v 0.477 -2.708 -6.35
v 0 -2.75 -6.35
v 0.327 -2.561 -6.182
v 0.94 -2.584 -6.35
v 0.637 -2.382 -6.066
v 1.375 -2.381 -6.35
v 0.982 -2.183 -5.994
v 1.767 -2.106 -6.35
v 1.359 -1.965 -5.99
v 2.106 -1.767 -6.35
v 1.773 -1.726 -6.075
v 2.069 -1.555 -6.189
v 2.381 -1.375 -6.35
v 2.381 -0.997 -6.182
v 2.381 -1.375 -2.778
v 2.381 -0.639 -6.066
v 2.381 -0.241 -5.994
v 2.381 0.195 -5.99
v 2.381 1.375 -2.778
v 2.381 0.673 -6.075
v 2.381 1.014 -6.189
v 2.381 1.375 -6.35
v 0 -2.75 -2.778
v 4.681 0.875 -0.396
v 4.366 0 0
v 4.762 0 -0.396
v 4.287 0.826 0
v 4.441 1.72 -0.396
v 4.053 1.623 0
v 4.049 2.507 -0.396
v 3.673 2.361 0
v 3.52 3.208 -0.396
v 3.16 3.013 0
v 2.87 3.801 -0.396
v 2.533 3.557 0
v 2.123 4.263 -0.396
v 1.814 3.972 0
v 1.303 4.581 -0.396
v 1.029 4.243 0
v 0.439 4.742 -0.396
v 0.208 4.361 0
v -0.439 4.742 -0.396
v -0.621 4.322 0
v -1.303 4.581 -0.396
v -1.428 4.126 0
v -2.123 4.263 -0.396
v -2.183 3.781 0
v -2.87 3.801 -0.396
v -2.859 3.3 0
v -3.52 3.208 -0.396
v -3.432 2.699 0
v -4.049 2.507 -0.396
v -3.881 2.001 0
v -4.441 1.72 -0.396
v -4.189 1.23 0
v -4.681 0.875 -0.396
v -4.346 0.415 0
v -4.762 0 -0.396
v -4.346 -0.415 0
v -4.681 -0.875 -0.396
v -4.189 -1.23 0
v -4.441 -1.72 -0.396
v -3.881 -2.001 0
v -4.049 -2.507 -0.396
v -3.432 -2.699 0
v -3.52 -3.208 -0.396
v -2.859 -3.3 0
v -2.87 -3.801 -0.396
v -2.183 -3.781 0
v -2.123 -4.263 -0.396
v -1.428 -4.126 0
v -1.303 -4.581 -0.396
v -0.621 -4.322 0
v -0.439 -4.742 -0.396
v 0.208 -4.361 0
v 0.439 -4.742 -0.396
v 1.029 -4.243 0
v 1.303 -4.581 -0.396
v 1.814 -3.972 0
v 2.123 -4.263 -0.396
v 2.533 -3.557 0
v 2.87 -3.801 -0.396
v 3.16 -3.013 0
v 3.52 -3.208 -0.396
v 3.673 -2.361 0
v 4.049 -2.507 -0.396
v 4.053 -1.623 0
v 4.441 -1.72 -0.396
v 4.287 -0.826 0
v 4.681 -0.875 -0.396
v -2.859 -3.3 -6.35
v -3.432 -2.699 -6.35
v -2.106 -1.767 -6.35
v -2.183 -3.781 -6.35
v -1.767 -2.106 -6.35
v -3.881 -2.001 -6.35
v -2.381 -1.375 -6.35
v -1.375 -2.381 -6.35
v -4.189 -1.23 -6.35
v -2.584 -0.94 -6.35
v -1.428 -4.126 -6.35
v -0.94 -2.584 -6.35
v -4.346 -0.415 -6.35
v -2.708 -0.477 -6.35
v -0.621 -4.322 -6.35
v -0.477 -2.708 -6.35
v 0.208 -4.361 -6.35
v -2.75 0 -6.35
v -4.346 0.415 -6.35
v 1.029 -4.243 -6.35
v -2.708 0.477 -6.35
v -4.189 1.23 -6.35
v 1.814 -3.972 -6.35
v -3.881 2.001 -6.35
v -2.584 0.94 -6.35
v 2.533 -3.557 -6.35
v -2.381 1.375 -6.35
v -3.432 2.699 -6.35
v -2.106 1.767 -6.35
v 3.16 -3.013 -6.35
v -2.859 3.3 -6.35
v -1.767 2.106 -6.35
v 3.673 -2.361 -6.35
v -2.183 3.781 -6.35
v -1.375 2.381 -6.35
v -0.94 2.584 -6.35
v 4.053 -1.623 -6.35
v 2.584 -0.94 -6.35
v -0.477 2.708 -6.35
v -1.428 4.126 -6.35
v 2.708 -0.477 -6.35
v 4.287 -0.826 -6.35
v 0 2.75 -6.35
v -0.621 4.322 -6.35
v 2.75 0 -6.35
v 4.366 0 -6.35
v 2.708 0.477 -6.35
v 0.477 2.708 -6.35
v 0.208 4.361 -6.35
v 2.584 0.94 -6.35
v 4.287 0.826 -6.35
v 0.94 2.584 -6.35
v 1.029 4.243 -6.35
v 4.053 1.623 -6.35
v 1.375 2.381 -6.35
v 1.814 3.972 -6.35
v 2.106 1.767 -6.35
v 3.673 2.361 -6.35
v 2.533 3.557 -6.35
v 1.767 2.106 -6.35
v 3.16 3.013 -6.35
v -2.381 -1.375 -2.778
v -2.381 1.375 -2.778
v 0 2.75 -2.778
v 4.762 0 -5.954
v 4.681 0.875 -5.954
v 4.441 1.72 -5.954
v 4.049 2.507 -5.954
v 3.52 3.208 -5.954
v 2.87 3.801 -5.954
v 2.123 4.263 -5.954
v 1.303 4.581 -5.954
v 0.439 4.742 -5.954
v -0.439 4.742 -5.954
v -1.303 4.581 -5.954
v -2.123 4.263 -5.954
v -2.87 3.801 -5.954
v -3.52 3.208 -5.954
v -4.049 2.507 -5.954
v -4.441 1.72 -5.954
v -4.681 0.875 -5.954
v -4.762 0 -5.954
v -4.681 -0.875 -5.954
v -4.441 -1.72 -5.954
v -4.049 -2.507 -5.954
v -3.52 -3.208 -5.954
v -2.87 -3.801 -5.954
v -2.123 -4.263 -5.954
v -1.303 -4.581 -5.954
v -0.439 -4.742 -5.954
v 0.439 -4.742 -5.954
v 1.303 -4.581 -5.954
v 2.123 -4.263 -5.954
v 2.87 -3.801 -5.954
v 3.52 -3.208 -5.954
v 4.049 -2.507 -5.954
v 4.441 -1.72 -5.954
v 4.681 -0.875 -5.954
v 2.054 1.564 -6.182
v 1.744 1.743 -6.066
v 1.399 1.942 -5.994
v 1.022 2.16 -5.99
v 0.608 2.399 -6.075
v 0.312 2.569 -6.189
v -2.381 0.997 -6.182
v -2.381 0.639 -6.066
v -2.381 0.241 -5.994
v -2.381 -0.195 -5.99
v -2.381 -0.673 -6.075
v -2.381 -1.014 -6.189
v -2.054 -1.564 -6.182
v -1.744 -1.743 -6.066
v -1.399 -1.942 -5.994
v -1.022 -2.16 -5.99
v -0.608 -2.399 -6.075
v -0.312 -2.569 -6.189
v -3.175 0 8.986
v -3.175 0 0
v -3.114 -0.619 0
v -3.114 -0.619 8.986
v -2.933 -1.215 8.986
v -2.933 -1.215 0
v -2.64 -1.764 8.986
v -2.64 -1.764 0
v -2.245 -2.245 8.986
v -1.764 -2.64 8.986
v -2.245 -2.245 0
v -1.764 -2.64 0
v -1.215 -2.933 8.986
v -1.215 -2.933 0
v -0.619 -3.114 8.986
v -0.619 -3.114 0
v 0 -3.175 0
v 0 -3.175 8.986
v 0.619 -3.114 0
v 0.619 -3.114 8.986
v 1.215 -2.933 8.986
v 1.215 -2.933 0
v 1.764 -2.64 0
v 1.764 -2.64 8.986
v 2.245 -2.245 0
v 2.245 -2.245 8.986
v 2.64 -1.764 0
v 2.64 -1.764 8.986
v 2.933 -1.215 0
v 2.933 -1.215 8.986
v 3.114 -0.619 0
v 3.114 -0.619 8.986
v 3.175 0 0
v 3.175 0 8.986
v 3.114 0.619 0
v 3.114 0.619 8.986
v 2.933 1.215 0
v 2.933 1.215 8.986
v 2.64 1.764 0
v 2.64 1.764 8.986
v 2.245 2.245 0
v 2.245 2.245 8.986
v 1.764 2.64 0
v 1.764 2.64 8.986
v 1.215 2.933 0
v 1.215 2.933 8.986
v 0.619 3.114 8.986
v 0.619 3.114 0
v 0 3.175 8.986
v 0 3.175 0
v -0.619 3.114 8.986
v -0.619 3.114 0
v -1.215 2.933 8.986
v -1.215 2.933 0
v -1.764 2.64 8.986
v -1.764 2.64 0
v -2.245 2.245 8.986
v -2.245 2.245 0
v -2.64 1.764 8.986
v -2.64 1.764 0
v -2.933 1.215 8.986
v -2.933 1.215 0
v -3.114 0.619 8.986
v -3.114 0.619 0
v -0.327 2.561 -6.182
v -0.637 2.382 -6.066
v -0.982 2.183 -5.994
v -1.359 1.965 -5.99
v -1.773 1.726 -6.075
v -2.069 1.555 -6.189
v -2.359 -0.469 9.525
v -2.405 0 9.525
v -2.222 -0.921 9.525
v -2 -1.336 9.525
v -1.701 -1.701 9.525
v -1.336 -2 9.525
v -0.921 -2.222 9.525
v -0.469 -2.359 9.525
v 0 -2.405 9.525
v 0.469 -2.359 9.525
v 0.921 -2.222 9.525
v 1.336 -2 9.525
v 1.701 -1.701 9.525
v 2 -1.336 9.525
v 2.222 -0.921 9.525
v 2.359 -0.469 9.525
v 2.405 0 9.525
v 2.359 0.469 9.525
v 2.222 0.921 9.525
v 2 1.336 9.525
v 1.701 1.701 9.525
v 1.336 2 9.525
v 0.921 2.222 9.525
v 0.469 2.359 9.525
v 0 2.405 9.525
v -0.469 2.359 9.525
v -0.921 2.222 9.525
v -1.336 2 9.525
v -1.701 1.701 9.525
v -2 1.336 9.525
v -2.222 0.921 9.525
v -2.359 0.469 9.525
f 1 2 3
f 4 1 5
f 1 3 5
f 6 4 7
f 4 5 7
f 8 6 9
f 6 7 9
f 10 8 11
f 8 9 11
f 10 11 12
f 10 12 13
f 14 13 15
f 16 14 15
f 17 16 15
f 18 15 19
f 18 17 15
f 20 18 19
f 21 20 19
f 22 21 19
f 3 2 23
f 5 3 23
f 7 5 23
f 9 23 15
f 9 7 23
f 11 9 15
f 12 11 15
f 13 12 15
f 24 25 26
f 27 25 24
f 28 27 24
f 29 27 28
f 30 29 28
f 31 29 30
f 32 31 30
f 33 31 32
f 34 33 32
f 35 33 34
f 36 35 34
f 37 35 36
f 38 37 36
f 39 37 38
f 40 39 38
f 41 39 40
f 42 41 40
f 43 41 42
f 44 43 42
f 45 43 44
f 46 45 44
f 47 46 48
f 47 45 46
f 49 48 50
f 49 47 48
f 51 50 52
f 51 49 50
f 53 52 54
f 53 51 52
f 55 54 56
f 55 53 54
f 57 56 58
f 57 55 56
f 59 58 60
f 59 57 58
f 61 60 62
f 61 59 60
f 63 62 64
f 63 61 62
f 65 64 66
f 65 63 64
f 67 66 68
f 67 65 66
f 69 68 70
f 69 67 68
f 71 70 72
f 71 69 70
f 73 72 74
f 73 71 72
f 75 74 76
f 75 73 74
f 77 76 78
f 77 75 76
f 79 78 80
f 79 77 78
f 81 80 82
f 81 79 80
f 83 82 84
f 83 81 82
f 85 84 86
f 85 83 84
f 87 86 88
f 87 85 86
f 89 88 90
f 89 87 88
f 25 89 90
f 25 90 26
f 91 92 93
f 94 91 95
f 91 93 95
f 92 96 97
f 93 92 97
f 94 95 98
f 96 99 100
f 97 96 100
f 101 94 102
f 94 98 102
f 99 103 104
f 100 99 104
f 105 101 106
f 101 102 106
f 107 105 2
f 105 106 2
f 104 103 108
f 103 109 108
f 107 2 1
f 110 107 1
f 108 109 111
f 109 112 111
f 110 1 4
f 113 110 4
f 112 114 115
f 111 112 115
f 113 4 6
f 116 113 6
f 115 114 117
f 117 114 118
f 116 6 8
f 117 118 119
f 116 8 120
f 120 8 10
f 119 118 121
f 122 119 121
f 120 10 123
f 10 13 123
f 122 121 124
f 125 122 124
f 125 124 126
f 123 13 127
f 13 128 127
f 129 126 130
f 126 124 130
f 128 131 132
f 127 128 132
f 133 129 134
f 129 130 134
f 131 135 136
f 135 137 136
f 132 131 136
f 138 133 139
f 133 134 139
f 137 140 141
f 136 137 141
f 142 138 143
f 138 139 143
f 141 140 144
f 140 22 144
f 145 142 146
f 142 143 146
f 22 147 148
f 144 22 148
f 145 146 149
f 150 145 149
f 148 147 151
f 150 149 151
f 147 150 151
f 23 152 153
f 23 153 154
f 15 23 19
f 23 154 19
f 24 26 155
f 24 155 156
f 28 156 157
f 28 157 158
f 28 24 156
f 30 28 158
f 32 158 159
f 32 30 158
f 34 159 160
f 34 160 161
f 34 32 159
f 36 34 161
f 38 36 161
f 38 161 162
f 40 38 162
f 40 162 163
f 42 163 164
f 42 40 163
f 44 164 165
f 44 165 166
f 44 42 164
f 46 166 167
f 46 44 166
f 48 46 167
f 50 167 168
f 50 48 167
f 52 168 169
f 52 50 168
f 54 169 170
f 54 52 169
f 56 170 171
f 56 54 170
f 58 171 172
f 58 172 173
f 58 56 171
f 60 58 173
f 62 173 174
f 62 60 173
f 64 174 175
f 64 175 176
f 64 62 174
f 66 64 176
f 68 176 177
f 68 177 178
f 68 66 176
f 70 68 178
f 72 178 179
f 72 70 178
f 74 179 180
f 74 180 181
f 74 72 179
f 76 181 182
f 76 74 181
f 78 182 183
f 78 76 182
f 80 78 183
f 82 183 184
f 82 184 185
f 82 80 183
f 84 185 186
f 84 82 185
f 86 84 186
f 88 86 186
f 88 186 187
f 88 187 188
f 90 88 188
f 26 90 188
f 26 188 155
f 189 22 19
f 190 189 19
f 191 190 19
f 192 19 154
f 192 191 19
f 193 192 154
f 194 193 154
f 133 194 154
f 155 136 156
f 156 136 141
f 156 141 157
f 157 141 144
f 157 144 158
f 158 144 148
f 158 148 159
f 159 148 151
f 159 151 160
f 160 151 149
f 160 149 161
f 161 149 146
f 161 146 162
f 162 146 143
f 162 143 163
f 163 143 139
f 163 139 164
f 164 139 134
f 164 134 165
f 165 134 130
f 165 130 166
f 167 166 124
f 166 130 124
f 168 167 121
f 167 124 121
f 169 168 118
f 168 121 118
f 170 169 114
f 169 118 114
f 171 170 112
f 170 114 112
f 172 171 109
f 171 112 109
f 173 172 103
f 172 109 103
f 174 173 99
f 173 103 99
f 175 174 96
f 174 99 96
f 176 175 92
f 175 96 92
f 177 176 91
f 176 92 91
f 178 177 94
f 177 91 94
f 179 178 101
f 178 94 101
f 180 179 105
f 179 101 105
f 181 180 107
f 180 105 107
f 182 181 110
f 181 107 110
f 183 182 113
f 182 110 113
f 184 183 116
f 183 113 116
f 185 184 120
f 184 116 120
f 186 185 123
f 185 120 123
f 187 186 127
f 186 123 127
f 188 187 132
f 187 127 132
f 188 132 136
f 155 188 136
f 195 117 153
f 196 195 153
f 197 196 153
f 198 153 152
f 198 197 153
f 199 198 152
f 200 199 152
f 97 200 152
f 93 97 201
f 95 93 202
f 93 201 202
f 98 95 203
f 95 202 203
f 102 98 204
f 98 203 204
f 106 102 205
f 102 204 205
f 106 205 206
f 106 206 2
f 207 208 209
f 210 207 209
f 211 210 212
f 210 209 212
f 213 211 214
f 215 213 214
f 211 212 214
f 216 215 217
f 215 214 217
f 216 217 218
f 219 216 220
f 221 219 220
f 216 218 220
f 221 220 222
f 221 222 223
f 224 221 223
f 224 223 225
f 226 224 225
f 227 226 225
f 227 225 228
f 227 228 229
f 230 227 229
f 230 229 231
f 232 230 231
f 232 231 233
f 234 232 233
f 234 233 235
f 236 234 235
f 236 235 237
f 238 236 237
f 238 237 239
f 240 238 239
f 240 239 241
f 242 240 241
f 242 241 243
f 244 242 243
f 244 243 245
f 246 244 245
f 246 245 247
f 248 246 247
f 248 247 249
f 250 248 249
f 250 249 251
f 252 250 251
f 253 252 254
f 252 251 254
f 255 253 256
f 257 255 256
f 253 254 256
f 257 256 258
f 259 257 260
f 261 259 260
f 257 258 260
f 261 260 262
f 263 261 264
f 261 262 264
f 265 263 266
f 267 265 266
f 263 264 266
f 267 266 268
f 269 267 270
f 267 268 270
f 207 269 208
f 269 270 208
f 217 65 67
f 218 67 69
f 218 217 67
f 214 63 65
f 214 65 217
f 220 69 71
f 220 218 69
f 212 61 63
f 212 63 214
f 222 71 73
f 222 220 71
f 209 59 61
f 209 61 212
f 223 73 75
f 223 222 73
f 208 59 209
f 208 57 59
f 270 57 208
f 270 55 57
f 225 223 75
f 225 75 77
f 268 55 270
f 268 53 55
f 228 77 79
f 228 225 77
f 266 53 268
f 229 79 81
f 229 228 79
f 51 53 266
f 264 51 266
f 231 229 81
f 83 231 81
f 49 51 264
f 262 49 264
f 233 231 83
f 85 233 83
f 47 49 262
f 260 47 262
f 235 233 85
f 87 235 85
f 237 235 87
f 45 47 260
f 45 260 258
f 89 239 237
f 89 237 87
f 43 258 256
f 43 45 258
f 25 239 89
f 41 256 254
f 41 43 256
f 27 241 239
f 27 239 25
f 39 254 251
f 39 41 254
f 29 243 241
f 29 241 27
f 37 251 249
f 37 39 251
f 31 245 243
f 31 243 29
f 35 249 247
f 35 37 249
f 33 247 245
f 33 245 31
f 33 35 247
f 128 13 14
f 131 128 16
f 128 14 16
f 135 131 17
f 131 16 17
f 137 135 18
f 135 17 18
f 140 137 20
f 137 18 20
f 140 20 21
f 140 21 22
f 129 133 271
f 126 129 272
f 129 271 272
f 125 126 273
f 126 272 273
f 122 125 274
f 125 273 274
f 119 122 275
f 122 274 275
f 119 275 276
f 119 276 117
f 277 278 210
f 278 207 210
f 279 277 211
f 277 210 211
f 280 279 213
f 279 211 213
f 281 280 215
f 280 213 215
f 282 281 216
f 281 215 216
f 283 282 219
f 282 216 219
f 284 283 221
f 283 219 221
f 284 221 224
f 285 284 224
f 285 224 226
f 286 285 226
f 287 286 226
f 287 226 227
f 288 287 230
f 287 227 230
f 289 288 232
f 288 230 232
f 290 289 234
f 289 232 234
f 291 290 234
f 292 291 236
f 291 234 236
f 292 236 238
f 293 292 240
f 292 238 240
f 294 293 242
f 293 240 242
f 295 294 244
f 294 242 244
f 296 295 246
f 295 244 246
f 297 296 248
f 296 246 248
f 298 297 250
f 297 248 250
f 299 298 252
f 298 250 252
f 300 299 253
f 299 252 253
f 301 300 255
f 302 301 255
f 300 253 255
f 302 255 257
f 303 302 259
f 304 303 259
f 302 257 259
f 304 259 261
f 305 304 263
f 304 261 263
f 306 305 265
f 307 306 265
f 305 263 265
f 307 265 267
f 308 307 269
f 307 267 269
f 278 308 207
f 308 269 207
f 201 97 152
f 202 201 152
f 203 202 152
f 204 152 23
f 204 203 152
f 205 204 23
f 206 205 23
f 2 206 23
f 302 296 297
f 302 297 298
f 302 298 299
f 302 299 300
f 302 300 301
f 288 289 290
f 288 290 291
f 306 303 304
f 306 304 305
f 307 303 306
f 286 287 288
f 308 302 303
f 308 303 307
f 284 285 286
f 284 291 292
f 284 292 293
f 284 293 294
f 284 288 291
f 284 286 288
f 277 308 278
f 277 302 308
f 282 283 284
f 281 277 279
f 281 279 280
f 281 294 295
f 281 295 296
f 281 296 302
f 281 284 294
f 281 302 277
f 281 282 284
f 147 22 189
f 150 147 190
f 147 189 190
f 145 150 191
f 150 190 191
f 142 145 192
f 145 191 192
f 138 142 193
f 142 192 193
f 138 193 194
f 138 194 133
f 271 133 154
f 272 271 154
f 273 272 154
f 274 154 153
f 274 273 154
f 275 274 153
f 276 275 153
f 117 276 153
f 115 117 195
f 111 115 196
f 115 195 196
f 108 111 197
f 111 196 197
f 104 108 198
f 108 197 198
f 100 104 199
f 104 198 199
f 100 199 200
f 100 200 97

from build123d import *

# Parameters (mm, degrees)
SKETCH1_R           = 3.175
BOSS_EXTRUDE1_DEPTH = 9.525
SKETCH3_R           = 4.7625
BOSS_EXTRUDE2_DEPTH = 6.35
CUT_EXTRUDE1_START  = -6.35
CUT_EXTRUDE1_DEPTH  = 3.571875
CHAMFER1_SIZE       = 0.39624


with BuildPart() as part:
    # Sketch1 → Boss-Extrude1 (new body)
    with BuildSketch(Plane.XY):
        with Locations(Location((0, 0, 0), (0, 0, 180))):
            Circle(SKETCH1_R)
    extrude(amount=BOSS_EXTRUDE1_DEPTH)

    # Sketch2 → Cut-Revolve1 (revolve, cut)
    with BuildSketch(Plane(origin=(0, 0, 0), x_dir=(0, 0, -1), z_dir=(1, 0, 0)), mode=Mode.PRIVATE) as cut_revolve1_sk:
        Polygon((-9.525, 3.175), (-9.525, 2.405444262), (-8.986151271, 3.175), align=None)
    revolve(cut_revolve1_sk.sketch.rotate(Axis((0, 0, 0), (0, 0, 1)), 90), axis=Axis((0, 0, 0), (0, 0, 1)), mode=Mode.SUBTRACT)

    # Sketch3 → Boss-Extrude2 (add)
    with BuildSketch(Plane.XY):
        Circle(SKETCH3_R)
    extrude(amount=-BOSS_EXTRUDE2_DEPTH)

    # Sketch4 → Cut-Extrude1 (cut)
    with BuildSketch(Plane.XY.offset(CUT_EXTRUDE1_START)):
        Polygon((0, -2.749630657), (2.38125, -1.374815329), (2.38125, 1.374815329), (0, 2.749630657), (-2.38125, 1.374815329), (-2.38125, -1.374815329), align=None)
    extrude(amount=CUT_EXTRUDE1_DEPTH, mode=Mode.SUBTRACT)

    # Cut-Extrude2 cone 1 section (through the dimple's axis) → Cut-Extrude2 (revolve, cut)
    with BuildSketch(Plane(origin=(0, 0, -6.35), x_dir=(0, 1, 0), z_dir=(1, 0, 0))):
        Polygon((0, 0), (2.749630657, 0), (0, 2.749630657), align=None)
    revolve(axis=Axis((0, 0, -6.35), (0, 0, 1)), mode=Mode.SUBTRACT)

    # Chamfer1
    chamfer1_edges = [part.edges().sort_by_distance(p)[0] for p in [
        (-4.7625, 0, -6.35),
        (-4.7625, 0, 0),
    ]]
    chamfer(chamfer1_edges, length=CHAMFER1_SIZE)


solid = part.part
